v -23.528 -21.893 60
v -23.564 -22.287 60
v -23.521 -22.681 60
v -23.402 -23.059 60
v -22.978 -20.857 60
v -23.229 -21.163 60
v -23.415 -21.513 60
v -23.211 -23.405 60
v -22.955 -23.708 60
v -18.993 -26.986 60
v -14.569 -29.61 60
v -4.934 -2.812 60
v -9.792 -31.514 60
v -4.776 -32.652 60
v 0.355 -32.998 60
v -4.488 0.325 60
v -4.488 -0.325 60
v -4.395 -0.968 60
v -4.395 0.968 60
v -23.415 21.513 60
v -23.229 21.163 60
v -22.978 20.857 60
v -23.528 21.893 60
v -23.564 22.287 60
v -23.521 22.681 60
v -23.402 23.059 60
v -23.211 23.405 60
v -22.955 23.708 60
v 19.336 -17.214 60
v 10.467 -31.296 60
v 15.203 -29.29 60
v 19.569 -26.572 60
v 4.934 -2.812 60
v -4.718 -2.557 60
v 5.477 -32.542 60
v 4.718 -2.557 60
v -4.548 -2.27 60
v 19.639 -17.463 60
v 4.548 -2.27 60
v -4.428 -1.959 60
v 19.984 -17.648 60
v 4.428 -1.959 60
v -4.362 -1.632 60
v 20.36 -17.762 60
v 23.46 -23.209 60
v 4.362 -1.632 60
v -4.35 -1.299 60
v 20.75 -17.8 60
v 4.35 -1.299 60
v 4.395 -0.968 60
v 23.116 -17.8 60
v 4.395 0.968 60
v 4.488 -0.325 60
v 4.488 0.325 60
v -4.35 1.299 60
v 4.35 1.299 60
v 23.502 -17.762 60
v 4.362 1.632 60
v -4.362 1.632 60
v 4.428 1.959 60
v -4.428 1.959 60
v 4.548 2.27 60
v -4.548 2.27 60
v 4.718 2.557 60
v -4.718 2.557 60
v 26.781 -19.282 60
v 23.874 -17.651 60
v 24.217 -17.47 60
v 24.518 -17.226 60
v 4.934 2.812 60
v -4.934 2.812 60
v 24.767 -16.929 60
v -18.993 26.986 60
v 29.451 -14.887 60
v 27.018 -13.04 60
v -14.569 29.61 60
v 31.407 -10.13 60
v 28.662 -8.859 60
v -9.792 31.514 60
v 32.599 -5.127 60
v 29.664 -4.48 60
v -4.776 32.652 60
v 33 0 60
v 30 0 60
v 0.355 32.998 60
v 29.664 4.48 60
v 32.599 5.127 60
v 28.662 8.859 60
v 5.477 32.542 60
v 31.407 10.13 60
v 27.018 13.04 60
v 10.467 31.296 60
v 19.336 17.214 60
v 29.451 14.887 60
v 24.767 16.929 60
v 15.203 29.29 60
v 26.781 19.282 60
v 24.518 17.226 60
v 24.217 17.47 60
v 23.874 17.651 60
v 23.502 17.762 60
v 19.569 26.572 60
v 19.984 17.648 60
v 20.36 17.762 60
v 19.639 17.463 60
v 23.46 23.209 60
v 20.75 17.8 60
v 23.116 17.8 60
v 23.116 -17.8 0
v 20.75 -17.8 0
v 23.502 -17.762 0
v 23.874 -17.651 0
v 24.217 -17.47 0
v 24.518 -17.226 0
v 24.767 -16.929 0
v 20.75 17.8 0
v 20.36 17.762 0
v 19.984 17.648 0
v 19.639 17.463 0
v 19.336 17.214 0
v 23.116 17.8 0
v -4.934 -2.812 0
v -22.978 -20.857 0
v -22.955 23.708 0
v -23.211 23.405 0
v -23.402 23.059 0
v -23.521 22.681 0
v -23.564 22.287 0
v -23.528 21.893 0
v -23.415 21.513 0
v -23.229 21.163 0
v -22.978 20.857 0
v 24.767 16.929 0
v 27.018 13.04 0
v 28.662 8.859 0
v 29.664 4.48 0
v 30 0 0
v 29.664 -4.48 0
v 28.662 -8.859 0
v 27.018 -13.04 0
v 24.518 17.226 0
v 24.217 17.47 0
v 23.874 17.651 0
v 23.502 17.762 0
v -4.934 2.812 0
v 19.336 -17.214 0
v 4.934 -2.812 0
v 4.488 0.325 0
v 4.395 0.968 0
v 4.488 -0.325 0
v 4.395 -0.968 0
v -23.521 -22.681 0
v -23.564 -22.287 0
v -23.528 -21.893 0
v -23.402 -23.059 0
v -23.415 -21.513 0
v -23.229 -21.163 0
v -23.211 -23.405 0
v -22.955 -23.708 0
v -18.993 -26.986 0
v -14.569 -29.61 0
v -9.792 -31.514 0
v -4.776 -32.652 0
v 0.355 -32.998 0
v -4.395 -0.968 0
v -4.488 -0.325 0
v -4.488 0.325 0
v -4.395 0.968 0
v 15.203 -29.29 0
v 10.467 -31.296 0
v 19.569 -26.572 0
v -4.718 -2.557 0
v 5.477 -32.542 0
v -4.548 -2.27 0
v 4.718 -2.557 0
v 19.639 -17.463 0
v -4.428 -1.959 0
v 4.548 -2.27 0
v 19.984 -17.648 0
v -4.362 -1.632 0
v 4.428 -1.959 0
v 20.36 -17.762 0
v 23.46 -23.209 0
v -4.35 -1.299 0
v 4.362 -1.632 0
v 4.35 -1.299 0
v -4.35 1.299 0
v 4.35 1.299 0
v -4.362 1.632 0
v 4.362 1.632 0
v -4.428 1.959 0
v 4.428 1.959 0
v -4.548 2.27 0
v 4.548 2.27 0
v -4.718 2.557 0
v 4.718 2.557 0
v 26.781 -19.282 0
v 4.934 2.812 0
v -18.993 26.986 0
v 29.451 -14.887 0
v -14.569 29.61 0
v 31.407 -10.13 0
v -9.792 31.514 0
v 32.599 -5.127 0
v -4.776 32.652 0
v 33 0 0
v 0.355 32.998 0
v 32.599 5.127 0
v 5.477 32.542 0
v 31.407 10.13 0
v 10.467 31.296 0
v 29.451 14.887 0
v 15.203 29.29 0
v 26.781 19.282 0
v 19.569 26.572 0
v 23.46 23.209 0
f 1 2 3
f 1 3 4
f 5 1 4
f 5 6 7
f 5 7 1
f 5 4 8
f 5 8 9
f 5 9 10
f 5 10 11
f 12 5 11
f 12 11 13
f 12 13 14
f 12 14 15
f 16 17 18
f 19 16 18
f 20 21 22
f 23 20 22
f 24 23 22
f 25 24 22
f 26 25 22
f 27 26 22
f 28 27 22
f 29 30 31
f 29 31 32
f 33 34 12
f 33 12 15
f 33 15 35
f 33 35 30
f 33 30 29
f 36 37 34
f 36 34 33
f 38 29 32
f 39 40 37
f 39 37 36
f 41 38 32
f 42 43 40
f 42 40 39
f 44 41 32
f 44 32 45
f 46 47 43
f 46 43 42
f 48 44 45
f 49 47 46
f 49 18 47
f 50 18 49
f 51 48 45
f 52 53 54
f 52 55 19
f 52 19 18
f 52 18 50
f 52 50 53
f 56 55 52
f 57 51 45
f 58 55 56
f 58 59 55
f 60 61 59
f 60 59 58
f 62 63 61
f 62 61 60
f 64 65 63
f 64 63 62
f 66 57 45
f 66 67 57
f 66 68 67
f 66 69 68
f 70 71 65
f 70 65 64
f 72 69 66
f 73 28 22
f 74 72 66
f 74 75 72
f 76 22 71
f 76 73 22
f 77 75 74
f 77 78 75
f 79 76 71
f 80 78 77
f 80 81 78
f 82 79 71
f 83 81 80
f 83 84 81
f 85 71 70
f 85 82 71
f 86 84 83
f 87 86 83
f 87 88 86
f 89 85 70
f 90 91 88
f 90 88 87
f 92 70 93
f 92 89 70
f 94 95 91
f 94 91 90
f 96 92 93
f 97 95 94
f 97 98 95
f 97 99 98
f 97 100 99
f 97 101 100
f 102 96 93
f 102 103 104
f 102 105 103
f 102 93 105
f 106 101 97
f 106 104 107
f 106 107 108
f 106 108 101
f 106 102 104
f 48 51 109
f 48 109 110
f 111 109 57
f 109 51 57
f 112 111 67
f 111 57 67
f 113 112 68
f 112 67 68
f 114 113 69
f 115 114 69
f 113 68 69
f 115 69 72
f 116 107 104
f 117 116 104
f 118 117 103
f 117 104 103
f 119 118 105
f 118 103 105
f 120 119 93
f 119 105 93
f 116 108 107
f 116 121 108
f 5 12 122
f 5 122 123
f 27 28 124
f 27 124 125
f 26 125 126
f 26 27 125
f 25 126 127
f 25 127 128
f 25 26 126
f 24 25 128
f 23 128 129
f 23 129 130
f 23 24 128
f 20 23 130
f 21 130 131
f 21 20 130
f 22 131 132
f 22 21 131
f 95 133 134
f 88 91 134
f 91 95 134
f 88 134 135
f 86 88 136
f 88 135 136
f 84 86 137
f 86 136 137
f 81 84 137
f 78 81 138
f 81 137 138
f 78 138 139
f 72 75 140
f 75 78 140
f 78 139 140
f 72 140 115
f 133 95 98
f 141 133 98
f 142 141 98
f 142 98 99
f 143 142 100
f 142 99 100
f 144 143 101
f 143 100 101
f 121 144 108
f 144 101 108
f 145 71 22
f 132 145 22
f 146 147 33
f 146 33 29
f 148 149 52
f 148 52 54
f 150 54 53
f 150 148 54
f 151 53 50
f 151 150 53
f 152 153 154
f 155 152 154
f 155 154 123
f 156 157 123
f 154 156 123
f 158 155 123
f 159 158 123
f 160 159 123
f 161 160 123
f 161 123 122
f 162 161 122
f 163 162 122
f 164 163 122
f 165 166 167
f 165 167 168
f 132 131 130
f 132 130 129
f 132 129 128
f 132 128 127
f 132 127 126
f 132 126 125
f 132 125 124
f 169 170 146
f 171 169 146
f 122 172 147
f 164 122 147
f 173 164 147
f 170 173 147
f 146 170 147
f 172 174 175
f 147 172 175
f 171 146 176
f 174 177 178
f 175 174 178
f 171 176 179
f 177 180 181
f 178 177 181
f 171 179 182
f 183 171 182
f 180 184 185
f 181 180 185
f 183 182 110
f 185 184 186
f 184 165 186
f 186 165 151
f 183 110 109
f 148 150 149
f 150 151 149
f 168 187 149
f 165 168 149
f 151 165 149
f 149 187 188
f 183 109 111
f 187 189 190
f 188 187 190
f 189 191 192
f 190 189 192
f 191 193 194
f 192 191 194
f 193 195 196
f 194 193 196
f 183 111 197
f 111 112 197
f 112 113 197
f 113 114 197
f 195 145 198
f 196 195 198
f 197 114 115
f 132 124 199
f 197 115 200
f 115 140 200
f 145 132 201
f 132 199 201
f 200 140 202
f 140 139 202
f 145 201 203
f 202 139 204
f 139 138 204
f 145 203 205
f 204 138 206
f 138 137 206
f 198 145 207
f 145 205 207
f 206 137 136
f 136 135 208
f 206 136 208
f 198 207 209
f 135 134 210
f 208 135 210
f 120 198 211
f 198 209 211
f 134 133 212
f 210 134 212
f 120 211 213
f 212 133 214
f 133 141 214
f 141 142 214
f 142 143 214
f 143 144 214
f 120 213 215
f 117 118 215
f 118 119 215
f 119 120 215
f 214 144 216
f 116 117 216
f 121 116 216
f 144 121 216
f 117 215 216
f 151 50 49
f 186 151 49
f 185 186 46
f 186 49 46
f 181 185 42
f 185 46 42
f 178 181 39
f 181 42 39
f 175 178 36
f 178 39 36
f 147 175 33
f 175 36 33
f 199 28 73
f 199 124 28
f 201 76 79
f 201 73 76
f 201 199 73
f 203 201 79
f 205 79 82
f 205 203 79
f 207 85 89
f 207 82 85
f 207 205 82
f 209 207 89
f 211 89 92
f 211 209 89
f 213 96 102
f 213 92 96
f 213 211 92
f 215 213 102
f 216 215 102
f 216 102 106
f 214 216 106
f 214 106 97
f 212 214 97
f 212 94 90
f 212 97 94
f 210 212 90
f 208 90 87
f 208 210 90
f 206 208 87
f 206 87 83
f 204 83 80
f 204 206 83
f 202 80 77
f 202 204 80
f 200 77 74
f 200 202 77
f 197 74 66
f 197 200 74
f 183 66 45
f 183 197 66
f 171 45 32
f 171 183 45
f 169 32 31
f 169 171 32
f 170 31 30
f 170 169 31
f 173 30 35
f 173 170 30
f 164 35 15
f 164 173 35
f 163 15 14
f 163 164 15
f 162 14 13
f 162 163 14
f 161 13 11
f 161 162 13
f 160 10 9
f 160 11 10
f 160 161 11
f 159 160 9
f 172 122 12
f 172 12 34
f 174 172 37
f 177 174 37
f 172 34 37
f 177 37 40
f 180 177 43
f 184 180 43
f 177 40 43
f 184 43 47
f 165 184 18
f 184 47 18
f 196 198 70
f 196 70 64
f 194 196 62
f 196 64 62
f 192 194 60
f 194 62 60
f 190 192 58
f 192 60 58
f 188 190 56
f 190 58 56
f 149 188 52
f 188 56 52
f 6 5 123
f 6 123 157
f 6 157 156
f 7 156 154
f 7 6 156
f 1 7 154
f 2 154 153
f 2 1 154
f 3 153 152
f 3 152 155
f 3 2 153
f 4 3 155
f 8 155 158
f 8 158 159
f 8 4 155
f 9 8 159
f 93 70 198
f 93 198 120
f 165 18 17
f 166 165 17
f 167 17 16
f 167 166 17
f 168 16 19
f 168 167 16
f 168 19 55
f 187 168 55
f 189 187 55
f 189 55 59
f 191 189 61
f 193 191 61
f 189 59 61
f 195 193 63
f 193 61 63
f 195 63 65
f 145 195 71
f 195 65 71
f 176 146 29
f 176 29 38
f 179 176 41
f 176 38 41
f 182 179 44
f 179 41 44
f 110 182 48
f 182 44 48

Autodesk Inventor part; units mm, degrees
ref_plane "YZ Plane" through (0, 0, 0) normal (1, 0, 0) x (0, 1, 0)
ref_plane "XZ Plane" through (0, 0, 0) normal (0, 1, 0) x (-1, 0, 0)
ref_plane "XY Plane" through (0, 0, 0) normal (0, 0, 1) x (1, 0, 0)
sketch "Sketch2" plane through (0, 0, 0) normal (0, 0, 1) x (1, 0, 0)
  arc A0 (20.126, -22.2473) -> (-20.126, -22.2473) centre (0, 0) ccw construction
  arc A1 (-24.3711, -22.2497) -> (-24.3711, 22.2497) centre (0, 0) ccw
  line L0 (32.9543, 32.9543) -> (23.3345, 23.3345) construction
  line L1 (-32.8174, 32.8174) -> (-23.3345, 23.3345) construction
  line L2 (23.3345, 23.3345) -> (-23.3345, -23.3345) construction
  line L3 (23.3345, -23.3345) -> (30.6779, -35.5804) construction
  line L4 (-23.3345, -23.3345) -> (-31.805, -34.2596) construction
  line L5 (-23.3345, 23.3345) -> (23.3345, -23.3345) construction
  line L6 (0, -33) -> (0, 33) construction
  line L7 (32.9543, 0) -> (-32.9543, 0) construction
  circle A2 centre (0, 0) radius 1.5
  circle A3 centre (0, 0) radius 4.5
  line L8 (4.0607, -1.9393) -> (22.2473, -20.126) construction
  line L9 (1.9393, -4.0607) -> (17.8, -19.9213) construction
  arc A4 (0, -30) -> (17.8, -24.1487) centre (0, 0) ccw construction
  line L10 (-1.9393, -4.0607) -> (-17.8, -19.9213) construction
  line L11 (-4.0607, -1.9393) -> (-22.2473, -20.126) construction
  line L12 (23.3345, 23.3345) -> (-23.3345, -23.3345) construction
  arc A5 (-20.126, -22.2473) -> (-17.8, -24.1487) centre (0, 0) ccw construction
  line L13 (17.8, -24.1487) -> (17.8, -19.9213) construction
  line L14 (-17.8, -24.1487) -> (-17.8, -19.9213) construction
  line L15 (17.8, -22.035) -> (-17.8, -22.035) construction
  arc A6 (-17.8, -24.1487) -> (0, -30) centre (0, 0) ccw construction
  line L16 (-17.8, -19.9213) -> (-20.126, -22.2473) construction
  line L17 (17.8, -19.9213) -> (20.126, -22.2473) construction
  arc A7 (17.8, -24.1487) -> (20.126, -22.2473) centre (0, 0) ccw construction
  line L18 (17.8, 19.9213) -> (20.126, 22.2473) construction
  arc A8 (20.126, 22.2473) -> (17.8, 24.1487) centre (0, 0) ccw construction
  arc A9 (-17.8, 24.1487) -> (-20.126, 22.2473) centre (0, 0) ccw construction
  line L19 (-17.8, 19.9213) -> (-20.126, 22.2473) construction
  line L20 (-1.9393, 4.0607) -> (-17.8, 19.9213) construction
  line L21 (1.9393, 4.0607) -> (17.8, 19.9213) construction
  line L22 (17.8, 24.1487) -> (17.8, 19.9213) construction
  arc A10 (17.8, 24.1487) -> (0, 30) centre (0, 0) ccw construction
  arc A11 (0, 30) -> (-17.8, 24.1487) centre (0, 0) ccw construction
  line L23 (-17.8, 24.1487) -> (-17.8, 19.9213) construction
  line L24 (4.0607, 1.9393) -> (22.2473, 20.126) construction
  line L25 (-4.0607, 1.9393) -> (-22.2473, 20.126) construction
  line L26 (-4.0607, 1.9393) -> (-24.3711, 22.2497)
  line L27 (-4.0607, -1.9393) -> (-24.3711, -22.2497)
  arc A12 (-24.3711, 22.2497) -> (-24.3711, -22.2497) centre (0, 0) ccw construction
  line L28 (24.1487, 17.8) -> (19.9213, 17.8)
  line L29 (4.0607, 1.9393) -> (19.9213, 17.8)
  arc A13 (30, 0) -> (24.1487, 17.8) centre (0, 0) ccw
  arc A14 (24.1487, -17.8) -> (30, 0) centre (0, 0) ccw
  line L30 (24.1487, -17.8) -> (19.9213, -17.8)
  line L31 (4.0607, -1.9393) -> (19.9213, -17.8)
  point P0 (0, -22.035)
  point P1 (22.035, 17.8)
  point P2 (22.035, -17.8)
  dimension "d32" = 60
  dimension "d33" = 3
  dimension "d34" = 3
  dimension "d35" = 3
  dimension "d36" = 1.5
  dimension "d37" = 3
  dimension "d38" = 35.6
  dimension "d43" = 45
  dimension "d47" = 90
extrude "Extrusion2" add sketch "Sketch2" along normal blind 60 contours L27 A3 L31 L30 A14 A13 L28 L29 L26 A1 | A3 | A2
fillet "Fillet2" radius 2 10 edges at (-24.3711, 22.2497, 30) (-24.3711, -22.2497, 30) (-4.0607, -1.9393, 30) (-4.0607, 1.9393, 30) (4.0607, -1.9393, 30) (4.0607, 1.9393, 30) (19.9213, -17.8, 30) (24.1487, -17.8, 30) (19.9213, 17.8, 30) (24.1487, 17.8, 30)
properties part number "Feeder Rotator" material "ABS Plastic"
